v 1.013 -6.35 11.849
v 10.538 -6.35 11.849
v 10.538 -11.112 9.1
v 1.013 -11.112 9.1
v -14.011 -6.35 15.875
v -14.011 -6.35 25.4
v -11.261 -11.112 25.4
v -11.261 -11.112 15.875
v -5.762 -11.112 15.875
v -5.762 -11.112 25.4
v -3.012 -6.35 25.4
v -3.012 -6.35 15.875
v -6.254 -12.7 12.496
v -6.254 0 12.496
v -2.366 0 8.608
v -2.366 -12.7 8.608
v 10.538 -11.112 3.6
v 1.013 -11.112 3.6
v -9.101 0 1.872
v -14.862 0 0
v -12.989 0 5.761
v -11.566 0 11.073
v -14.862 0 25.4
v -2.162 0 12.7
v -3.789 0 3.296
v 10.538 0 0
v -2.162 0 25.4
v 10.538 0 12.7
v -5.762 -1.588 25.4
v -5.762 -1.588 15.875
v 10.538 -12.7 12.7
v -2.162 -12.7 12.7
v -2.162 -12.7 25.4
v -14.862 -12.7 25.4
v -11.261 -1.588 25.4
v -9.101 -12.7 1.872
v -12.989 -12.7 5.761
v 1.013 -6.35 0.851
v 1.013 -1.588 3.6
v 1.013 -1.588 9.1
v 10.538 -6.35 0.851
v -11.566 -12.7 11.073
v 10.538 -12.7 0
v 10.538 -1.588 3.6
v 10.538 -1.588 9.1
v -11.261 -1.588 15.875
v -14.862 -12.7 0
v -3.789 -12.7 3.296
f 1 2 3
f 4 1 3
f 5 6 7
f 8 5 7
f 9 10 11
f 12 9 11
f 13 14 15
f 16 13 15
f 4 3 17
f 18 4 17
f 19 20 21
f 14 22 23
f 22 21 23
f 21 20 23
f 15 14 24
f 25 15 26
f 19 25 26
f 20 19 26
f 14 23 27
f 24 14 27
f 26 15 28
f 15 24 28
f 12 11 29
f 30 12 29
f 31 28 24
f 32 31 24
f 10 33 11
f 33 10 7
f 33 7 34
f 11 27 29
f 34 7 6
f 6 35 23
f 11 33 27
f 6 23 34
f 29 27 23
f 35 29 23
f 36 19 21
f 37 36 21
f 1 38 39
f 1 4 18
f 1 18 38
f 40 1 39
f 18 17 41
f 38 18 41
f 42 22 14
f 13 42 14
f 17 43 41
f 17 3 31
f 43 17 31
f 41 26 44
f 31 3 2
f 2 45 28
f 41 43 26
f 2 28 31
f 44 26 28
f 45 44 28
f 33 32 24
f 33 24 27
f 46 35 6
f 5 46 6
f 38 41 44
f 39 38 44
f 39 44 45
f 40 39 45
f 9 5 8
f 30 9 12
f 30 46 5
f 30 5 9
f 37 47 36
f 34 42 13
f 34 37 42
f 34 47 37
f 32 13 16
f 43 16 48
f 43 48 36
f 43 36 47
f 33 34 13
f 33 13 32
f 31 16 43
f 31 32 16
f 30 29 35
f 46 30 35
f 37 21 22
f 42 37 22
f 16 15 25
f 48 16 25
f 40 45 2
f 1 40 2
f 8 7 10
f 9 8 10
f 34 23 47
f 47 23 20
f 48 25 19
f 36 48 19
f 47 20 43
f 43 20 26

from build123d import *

# Parameters (mm, degrees)
F1_DEPTH = 12.7
F3_DEPTH = 9.525
F5_DEPTH = 9.525


# Not quite as in the source:
# - a feature names something its author has since deleted; it is built from what else it names


with BuildPart() as f1:
    # F0 (on Front) → F1 (new body)
    with BuildSketch(Plane.XZ):
        Polygon((-2.1617002284, 25.4), (-14.8617002284, 25.4), (-14.8617002284, 0), (10.5382997716, 0), (10.5382997716, 12.7), (-2.1617002284, 12.7), align=None)
        Polygon((-6.2541817694, 12.4960834256), (-2.3656168028, 8.6075184589), (-3.7889303648, 3.2956399302), (-9.1008088936, 1.8723263681), (-12.9893738602, 5.7608913348), (-11.5660602982, 11.0727698635), align=None, mode=Mode.SUBTRACT)
    extrude(amount=F1_DEPTH)

    # F2 (on face) → F3 (cut)
    with BuildSketch(Plane.XY.offset(25.4)):
        Polygon((-5.7620695714, -11.1125), (-3.0124389143, -6.35), (-5.7620695714, -1.5875), (-11.2613308854, -1.5875), (-14.0109615424, -6.35), (-11.2613308854, -11.1125), align=None)
    extrude(amount=-F3_DEPTH, mode=Mode.SUBTRACT)

    # F4 (on face) → F5 (cut)
    with BuildSketch(Plane.YZ.offset(10.5382997716)):
        Polygon((-6.35, 0.850738686), (-1.5875, 3.600369343), (-1.5875, 9.099630657), (-6.35, 11.849261314), (-11.1125, 9.099630657), (-11.1125, 3.600369343), align=None)
    extrude(amount=-F5_DEPTH, mode=Mode.SUBTRACT)


solid = f1.part
